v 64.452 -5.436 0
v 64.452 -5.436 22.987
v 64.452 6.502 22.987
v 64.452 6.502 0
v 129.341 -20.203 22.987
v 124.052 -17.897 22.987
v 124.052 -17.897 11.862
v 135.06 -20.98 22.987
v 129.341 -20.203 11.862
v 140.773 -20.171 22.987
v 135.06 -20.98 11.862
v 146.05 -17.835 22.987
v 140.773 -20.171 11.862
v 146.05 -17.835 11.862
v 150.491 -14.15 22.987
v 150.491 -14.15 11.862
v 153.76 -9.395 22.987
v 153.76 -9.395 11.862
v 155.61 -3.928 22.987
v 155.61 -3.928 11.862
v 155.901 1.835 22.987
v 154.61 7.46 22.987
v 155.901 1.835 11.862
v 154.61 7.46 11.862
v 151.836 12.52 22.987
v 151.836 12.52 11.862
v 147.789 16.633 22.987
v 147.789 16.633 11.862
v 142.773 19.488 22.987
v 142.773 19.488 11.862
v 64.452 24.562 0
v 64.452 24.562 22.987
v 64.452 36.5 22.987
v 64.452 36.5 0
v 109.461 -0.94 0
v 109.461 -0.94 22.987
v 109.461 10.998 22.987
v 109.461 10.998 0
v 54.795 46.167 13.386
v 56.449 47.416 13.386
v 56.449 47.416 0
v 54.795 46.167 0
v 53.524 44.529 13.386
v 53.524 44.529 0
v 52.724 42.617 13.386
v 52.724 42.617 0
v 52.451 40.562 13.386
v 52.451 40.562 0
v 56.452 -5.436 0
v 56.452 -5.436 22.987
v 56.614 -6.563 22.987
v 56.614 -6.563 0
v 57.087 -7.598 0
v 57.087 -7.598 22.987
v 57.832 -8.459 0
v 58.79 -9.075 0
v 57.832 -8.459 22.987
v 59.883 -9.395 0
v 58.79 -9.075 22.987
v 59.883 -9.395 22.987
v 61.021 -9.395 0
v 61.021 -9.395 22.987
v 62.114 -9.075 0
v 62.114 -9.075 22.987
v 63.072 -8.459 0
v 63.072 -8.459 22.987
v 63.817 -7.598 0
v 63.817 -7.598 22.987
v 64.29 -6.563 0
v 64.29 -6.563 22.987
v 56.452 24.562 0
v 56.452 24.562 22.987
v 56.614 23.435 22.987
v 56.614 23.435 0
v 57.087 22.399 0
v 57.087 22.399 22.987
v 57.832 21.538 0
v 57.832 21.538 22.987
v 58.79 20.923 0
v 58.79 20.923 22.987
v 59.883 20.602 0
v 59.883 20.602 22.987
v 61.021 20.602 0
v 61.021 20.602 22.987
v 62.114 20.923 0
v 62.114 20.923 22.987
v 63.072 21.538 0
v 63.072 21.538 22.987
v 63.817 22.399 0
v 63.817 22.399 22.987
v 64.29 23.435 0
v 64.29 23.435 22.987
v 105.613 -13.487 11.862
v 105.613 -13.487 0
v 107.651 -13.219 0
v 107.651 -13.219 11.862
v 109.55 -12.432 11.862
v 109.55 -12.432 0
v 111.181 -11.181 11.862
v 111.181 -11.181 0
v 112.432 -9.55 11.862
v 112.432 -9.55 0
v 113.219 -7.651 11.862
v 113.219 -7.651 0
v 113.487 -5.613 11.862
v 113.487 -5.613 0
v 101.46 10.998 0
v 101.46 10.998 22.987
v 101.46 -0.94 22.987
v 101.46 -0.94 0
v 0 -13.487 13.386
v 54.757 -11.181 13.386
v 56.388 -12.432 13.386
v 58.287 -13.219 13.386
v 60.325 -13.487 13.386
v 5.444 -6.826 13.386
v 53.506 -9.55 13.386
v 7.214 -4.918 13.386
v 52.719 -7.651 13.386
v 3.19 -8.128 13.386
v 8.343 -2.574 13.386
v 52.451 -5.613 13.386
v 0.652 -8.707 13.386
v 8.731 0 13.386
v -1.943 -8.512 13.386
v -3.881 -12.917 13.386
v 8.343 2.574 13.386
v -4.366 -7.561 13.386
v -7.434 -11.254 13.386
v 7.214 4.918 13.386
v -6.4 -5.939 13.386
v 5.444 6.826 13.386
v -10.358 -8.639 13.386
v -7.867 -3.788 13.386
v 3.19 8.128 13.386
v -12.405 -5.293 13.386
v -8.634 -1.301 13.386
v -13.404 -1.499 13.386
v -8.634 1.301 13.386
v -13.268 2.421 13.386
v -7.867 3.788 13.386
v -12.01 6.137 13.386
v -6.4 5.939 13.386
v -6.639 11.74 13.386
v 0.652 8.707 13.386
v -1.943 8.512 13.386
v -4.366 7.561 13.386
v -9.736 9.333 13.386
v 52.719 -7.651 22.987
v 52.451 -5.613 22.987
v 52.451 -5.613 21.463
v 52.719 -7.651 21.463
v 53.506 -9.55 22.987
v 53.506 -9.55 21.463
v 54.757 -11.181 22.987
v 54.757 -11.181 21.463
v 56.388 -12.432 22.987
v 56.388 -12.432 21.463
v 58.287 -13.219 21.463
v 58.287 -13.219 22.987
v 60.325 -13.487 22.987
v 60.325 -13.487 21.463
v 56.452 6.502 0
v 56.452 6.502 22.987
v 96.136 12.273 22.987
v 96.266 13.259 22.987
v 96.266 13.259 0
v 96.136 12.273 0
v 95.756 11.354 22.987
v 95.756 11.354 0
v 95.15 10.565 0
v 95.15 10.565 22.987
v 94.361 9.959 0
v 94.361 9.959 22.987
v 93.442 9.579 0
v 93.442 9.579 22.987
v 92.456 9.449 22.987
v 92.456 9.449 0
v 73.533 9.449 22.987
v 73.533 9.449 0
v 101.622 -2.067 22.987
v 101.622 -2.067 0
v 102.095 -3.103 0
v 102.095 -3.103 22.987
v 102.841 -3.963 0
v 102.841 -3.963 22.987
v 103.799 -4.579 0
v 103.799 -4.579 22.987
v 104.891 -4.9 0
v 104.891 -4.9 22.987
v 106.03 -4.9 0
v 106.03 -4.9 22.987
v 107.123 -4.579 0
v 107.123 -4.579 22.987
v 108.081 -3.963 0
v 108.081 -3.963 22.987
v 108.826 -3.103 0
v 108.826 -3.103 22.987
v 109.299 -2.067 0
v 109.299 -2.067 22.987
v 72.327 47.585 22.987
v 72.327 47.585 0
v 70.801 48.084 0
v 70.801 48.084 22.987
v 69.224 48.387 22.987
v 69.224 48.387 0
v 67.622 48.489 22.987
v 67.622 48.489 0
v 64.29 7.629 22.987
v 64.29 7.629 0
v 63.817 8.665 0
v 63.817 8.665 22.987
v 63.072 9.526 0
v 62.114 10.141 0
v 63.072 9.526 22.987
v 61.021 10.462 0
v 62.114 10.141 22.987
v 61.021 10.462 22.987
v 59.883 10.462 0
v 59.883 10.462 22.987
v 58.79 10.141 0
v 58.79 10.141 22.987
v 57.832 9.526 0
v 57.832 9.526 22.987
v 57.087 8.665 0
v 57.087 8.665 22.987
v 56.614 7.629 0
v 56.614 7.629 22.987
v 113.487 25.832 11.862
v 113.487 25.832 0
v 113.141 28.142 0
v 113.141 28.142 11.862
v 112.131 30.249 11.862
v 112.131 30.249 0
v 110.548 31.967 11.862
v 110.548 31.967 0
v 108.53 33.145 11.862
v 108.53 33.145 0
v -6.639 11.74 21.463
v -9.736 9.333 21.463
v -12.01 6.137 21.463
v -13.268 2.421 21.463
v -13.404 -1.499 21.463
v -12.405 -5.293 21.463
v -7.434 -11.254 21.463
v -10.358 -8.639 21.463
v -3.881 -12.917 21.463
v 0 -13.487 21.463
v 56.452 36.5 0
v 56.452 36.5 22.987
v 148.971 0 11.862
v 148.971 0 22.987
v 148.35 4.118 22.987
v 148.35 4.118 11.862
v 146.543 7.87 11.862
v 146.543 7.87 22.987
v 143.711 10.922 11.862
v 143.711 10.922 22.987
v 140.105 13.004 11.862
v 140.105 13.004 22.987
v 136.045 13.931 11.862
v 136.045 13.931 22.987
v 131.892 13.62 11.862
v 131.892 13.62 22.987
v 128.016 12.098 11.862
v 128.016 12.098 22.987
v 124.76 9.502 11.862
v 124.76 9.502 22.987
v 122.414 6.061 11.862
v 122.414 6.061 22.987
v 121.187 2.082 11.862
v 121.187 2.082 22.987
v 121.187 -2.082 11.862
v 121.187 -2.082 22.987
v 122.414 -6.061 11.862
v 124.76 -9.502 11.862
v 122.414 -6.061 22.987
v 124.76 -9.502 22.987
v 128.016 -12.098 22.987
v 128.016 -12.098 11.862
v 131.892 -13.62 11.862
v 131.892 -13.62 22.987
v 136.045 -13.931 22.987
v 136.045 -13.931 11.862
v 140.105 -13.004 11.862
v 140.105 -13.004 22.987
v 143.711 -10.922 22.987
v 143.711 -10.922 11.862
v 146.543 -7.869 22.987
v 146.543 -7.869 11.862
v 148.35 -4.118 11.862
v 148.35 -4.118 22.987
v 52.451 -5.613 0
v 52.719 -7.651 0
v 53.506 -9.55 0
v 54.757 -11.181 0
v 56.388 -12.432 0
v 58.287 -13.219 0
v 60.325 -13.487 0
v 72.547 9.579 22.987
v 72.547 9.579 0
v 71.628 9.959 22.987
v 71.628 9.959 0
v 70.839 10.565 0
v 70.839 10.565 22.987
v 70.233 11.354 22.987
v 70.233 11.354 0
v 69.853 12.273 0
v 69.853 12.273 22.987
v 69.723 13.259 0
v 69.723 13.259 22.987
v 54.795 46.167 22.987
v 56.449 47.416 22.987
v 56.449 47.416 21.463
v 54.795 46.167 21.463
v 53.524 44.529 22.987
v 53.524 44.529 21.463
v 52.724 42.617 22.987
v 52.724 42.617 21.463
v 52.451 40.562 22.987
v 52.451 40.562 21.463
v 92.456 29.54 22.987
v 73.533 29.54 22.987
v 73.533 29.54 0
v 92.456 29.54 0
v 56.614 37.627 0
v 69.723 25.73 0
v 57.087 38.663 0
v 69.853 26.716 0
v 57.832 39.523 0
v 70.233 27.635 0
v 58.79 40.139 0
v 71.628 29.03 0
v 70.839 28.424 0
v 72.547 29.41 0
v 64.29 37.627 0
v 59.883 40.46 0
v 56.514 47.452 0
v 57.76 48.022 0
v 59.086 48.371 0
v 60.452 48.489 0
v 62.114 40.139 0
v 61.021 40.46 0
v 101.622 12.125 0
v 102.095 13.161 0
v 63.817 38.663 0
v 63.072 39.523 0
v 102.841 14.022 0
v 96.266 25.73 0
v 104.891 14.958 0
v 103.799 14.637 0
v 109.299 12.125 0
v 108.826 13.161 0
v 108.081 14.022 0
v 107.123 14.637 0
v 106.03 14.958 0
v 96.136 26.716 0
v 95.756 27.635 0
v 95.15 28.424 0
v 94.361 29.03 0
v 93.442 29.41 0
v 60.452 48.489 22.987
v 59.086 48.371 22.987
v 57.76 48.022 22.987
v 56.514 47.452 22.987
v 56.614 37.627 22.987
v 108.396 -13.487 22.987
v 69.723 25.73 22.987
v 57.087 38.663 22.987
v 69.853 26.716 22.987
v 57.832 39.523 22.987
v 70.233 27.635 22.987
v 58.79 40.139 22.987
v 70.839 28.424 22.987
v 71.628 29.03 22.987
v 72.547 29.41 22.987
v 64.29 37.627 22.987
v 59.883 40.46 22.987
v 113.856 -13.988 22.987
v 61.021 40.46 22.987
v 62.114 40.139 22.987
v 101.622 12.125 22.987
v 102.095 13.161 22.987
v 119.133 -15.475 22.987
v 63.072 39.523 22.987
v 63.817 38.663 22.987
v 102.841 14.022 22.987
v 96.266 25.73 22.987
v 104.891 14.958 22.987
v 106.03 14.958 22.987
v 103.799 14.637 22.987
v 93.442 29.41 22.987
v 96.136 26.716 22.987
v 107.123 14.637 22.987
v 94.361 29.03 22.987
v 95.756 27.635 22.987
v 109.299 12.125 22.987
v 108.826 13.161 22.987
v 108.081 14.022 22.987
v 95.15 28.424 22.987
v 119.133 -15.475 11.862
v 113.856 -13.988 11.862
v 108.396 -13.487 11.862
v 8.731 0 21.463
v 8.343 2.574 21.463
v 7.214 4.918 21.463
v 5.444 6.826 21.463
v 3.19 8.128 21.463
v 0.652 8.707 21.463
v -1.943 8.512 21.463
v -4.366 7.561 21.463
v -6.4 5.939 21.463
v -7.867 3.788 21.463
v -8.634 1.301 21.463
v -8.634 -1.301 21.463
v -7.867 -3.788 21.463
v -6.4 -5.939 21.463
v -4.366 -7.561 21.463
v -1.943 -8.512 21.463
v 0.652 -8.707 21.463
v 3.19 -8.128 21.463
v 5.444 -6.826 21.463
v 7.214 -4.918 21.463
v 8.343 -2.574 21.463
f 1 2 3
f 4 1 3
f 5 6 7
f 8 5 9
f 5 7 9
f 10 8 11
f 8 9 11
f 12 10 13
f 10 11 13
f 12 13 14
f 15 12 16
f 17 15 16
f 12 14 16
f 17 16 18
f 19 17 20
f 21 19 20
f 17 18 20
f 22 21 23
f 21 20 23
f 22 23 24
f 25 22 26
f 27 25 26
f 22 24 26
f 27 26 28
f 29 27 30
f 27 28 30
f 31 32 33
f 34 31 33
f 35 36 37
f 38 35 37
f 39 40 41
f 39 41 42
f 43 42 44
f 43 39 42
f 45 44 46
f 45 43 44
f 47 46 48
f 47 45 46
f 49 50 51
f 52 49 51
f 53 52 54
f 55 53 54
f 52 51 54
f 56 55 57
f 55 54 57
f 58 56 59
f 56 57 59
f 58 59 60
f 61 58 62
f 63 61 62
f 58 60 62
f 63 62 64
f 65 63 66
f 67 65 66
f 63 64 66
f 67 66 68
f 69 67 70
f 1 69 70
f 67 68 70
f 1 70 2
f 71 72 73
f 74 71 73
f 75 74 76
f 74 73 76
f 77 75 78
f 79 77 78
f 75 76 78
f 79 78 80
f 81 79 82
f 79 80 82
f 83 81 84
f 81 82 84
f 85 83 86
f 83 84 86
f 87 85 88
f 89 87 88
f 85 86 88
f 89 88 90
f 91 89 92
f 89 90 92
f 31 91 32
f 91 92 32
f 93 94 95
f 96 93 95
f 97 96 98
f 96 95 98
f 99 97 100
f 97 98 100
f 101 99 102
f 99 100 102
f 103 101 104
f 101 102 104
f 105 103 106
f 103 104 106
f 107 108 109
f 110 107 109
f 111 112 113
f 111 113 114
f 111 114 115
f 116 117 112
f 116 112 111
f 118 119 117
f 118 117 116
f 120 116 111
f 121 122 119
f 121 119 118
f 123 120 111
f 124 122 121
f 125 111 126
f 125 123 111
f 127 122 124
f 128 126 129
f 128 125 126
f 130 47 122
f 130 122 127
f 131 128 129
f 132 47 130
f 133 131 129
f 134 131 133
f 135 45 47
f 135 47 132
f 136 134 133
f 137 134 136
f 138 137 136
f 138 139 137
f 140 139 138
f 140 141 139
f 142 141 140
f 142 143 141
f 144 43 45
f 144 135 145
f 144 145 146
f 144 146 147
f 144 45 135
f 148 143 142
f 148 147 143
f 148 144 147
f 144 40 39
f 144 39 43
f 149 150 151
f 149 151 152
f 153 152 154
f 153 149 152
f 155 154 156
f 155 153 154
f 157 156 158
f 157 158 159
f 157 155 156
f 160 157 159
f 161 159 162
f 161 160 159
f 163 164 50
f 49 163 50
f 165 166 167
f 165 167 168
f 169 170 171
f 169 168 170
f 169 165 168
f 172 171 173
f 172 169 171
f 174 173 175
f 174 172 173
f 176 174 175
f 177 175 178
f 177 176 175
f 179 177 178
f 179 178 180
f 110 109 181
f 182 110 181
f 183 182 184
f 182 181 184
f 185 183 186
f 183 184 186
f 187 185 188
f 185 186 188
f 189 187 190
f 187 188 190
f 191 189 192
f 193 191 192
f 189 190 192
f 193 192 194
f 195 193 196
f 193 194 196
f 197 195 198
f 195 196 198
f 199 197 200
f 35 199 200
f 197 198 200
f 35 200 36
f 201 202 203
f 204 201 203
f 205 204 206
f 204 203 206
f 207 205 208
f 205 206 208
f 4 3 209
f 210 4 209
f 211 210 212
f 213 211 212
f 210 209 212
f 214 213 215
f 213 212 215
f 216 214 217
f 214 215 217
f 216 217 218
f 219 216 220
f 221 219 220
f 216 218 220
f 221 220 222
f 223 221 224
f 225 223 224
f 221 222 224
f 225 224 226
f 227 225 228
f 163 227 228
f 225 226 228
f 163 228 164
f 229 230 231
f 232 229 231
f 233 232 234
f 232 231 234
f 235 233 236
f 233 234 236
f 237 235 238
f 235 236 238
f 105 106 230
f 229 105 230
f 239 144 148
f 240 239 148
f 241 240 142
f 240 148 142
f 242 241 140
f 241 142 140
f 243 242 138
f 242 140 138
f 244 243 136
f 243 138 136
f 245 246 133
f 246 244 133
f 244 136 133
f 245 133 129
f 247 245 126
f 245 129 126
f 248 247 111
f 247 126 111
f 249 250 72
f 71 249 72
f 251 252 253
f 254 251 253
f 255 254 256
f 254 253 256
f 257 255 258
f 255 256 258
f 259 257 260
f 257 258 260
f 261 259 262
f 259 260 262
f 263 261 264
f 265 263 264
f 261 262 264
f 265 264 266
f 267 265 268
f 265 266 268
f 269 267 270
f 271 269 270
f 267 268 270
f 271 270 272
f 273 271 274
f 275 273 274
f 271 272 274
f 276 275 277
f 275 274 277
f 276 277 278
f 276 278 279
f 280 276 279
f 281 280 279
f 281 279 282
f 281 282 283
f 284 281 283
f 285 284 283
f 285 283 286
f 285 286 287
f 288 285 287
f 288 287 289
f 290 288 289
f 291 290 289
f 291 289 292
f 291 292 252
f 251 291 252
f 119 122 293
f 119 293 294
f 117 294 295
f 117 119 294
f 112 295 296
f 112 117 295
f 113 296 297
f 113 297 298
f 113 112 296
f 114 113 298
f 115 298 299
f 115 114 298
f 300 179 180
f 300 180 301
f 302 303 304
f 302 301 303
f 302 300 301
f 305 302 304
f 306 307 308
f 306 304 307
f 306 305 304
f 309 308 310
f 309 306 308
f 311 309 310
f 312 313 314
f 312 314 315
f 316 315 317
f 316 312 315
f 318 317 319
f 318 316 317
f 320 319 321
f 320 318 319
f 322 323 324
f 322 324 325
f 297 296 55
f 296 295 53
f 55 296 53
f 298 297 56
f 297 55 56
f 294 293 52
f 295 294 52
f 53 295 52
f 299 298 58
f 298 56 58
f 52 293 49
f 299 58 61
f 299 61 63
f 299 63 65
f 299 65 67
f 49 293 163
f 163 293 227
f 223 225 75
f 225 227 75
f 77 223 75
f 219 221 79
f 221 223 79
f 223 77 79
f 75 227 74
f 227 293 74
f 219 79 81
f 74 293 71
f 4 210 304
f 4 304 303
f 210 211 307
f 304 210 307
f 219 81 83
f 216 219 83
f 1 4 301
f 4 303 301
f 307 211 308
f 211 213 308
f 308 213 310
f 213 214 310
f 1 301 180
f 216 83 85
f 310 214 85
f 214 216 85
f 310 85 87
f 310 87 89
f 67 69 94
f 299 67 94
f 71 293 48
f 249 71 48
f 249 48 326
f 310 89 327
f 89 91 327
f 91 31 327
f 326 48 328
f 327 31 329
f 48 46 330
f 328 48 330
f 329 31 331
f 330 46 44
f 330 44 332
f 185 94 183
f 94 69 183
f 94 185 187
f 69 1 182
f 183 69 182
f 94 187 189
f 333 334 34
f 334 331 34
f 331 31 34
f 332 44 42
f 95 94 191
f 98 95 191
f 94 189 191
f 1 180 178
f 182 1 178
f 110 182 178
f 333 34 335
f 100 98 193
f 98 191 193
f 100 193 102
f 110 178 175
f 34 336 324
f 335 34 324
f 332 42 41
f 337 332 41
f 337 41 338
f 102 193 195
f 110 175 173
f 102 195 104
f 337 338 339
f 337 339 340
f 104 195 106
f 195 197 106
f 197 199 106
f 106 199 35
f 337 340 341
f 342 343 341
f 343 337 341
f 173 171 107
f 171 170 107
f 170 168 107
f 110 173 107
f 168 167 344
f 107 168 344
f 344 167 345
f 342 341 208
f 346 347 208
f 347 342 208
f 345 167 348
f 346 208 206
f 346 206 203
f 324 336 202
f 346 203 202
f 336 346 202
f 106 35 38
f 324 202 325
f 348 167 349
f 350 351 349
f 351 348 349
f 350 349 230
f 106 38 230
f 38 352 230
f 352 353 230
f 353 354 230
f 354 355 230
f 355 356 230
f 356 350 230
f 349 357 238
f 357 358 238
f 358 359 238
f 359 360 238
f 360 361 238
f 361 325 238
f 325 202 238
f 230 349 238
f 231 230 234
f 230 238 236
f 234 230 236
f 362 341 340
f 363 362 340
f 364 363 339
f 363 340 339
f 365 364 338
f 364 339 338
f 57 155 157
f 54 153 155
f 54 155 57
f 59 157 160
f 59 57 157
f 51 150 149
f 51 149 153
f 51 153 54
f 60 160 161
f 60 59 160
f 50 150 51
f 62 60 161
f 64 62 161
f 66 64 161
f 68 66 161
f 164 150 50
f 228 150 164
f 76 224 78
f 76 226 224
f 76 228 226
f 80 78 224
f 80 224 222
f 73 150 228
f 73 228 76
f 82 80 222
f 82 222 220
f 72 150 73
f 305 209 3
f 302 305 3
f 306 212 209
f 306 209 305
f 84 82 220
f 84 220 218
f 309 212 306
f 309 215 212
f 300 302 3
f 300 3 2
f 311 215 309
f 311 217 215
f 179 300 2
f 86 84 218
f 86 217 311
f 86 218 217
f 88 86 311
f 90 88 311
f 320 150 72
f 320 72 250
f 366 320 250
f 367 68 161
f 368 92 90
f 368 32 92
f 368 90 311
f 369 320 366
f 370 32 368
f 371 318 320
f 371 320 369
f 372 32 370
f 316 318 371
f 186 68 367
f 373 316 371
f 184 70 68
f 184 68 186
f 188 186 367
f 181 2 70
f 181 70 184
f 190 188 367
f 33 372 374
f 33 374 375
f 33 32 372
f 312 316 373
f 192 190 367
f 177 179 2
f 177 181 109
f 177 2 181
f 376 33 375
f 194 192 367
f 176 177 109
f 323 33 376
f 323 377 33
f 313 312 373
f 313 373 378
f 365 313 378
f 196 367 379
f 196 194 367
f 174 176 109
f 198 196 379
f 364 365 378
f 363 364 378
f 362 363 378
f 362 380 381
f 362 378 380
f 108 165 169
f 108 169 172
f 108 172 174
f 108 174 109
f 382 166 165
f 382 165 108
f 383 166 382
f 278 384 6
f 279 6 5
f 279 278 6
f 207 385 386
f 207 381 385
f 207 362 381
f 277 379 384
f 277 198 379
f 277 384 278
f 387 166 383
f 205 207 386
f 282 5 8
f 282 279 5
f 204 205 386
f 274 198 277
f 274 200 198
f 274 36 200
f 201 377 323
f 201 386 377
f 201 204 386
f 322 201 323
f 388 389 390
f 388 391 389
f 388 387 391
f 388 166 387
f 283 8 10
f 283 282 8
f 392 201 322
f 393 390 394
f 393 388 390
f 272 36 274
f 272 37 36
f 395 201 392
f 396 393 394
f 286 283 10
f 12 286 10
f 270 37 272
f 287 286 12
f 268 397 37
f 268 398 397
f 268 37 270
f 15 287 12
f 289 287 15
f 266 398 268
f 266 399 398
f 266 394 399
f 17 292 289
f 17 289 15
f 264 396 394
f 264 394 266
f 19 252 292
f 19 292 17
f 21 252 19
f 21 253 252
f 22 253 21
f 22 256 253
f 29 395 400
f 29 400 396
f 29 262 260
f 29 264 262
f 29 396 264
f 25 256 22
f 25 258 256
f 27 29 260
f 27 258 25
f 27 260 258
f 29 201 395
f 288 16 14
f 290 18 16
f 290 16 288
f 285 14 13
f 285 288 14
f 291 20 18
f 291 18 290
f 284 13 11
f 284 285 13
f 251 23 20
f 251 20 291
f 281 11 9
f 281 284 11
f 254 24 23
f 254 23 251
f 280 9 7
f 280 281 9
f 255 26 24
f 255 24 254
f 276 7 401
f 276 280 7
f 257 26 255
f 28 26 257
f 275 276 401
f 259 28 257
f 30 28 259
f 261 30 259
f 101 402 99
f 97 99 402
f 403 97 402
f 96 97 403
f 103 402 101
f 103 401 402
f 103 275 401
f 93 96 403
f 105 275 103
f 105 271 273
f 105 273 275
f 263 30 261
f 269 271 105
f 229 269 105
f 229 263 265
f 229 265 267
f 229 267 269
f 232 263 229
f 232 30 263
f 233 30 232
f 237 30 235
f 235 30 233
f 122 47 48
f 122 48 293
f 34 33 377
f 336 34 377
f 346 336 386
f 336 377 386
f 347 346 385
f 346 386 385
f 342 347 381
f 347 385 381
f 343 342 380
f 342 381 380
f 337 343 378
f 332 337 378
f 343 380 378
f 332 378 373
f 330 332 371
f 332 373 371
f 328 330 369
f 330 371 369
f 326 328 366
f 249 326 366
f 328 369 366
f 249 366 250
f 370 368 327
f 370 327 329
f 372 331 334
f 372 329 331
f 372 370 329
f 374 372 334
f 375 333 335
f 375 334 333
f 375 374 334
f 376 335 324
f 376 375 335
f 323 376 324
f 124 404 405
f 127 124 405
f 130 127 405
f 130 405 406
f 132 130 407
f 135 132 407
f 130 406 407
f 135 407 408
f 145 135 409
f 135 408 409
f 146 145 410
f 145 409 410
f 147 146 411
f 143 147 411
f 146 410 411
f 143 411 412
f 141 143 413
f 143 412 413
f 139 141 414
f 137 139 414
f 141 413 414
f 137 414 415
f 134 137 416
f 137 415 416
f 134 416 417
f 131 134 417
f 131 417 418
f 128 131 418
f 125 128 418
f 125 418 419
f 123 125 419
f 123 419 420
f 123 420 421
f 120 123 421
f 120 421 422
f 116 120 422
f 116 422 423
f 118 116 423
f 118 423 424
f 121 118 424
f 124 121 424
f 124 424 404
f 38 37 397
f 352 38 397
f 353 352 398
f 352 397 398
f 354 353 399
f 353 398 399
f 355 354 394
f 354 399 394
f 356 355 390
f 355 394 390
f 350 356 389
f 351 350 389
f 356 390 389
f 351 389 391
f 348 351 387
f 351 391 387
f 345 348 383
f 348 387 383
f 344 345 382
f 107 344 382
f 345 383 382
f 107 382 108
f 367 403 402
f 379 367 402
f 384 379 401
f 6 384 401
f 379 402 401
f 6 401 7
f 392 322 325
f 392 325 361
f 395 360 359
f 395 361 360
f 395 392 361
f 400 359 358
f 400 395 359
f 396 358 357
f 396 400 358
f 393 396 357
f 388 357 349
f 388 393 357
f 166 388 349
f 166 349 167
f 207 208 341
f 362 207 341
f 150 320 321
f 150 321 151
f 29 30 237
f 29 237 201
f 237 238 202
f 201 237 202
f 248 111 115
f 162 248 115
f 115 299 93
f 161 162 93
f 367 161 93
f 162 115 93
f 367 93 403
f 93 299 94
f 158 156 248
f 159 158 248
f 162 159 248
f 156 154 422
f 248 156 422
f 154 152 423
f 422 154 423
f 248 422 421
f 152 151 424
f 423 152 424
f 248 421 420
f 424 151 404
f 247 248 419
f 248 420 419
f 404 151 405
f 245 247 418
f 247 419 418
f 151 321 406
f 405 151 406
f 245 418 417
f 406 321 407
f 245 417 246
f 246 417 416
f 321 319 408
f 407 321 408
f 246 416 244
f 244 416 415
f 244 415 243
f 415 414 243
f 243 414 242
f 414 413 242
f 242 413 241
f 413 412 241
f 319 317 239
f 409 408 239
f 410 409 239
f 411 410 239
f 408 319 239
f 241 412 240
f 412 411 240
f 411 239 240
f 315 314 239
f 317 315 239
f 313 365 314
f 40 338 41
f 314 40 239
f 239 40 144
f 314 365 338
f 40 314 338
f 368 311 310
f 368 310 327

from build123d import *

# Parameters (mm, degrees)
BASE_EXTRUDE_DEPTH = 22.987
CUT_EXTRUDE1_DEPTH = 1.524
CUT_EXTRUDE2_START = -13.3858
CUT_EXTRUDE2_DEPTH = 13.3858
CUT_EXTRUDE3_DEPTH = 11.8618
SKETCH5_R          = 8.73125
CUT_EXTRUDE4_DEPTH = 165.748162847
SKETCH6_R          = 13.97
CUT_EXTRUDE5_DEPTH = 165.9536267
CUT_EXTRUDE6_DEPTH = 165.9536267


with BuildPart() as part:
    # Sketch1 → Base-Extrude (new body)
    with BuildSketch(Plane.XY):
        with BuildLine():
            Line((67.622164121, 48.488607139), (60.451998121, 48.488607139))
            ThreePointArc((60.451998121, 48.488607139), (58.415767784, 48.225162891), (56.513628913, 47.45217869))
            Line((56.513628913, 47.45217869), (-6.63896207, 11.740278591))
            ThreePointArc((-6.63896207, 11.740278591), (-13.04330848, -3.432500932), (0, -13.4874))
            Line((0, -13.4874), (108.3963288, -13.4874))
            ThreePointArc((108.3963288, -13.4874), (116.52844195, -14.610715729), (124.051506942, -17.896533077))
            ThreePointArc((124.051506942, -17.896533077), (153.760306668, -9.394598854), (142.773406597, 19.487639521))
            Line((142.773406597, 19.487639521), (72.327100379, 47.584944713))
            ThreePointArc((72.327100379, 47.584944713), (70.017630202, 48.26064561), (67.622164121, 48.488607139))
        make_face()
    extrude(amount=BASE_EXTRUDE_DEPTH)

    # Sketch2 → Cut-Extrude1 (cut)
    with BuildSketch(Plane.XY.offset(22.987)):
        with BuildLine():
            Line((52.451, 40.561691476), (52.451, -5.6134))
            ThreePointArc((52.451, -5.6134), (54.757241386, -11.181158976), (60.325000513, -13.4874))
            Line((60.325000513, -13.4874), (60.325000513, -28.150605259))
            Line((60.325000513, -28.150605259), (-23.486257356, -28.150605259))
            Line((-23.486257356, -28.150605259), (-22.173444803, 52.159193632))
            Line((-22.173444803, 52.159193632), (56.513628913, 52.159193632))
            Line((56.513628913, 52.159193632), (56.513628913, 47.45217869))
            Line((56.513628913, 47.45217869), (56.449146437, 47.415714759))
            ThreePointArc((56.449146437, 47.415714759), (53.523590332, 44.529146898), (52.451, 40.561691476))
        make_face()
    extrude(amount=-CUT_EXTRUDE1_DEPTH, mode=Mode.SUBTRACT)

    # Sketch3 → Cut-Extrude2 (cut)
    with BuildSketch(Plane(origin=(0, 0, 0), x_dir=(-1, 0, 0), z_dir=(0, 0, -1)).offset(CUT_EXTRUDE2_START)):
        with BuildLine():
            Line((-52.451, 40.561691476), (-52.451, -5.6134))
            ThreePointArc((-52.451, -5.6134), (-54.757241386, -11.181158976), (-60.325000513, -13.4874))
            Line((-60.325000513, -13.4874), (-60.325000513, -35.585726692))
            Line((-60.325000513, -35.585726692), (18.461929403, -35.585726692))
            Line((18.461929403, -35.585726692), (18.461929403, 62.437610527))
            Line((18.461929403, 62.437610527), (-56.449146437, 62.437610527))
            Line((-56.449146437, 62.437610527), (-56.449146437, 47.415714759))
            ThreePointArc((-56.449146437, 47.415714759), (-53.523590332, 44.529146898), (-52.451, 40.561691476))
        make_face()
    extrude(amount=CUT_EXTRUDE2_DEPTH, mode=Mode.SUBTRACT)

    # Sketch4 → Cut-Extrude3 (cut)
    with BuildSketch(Plane(origin=(0, 0, 0), x_dir=(-1, 0, 0), z_dir=(0, 0, -1))):
        with BuildLine():
            Line((-113.4872, -5.6134), (-113.4872, 25.831689784))
            ThreePointArc((-113.4872, 25.831689784), (-112.131206016, 30.249321907), (-108.530259798, 33.145419212))
            Line((-108.530259798, 33.145419212), (-119.346107198, 60.263197686))
            Line((-119.346107198, 60.263197686), (-162.925004358, 60.263197686))
            Line((-162.925004358, 60.263197686), (-162.925004358, -25.739632552))
            Line((-162.925004358, -25.739632552), (-105.6132, -25.739632552))
            Line((-105.6132, -25.739632552), (-105.6132, -13.4874))
            ThreePointArc((-105.6132, -13.4874), (-111.180958795, -11.181158795), (-113.4872, -5.6134))
        make_face()
    extrude(amount=-CUT_EXTRUDE3_DEPTH, mode=Mode.SUBTRACT)

    # Sketch5 → Cut-Extrude4 (cut, through all)
    with BuildSketch(Plane.XY.offset(21.463)):
        Circle(SKETCH5_R)
    extrude(amount=-CUT_EXTRUDE4_DEPTH, mode=Mode.SUBTRACT)

    # Sketch6 → Cut-Extrude5 (cut, through all)
    with BuildSketch(Plane.XY.offset(22.987)):
        with Locations((135.000853225, 8.827e-05)):
            Circle(SKETCH6_R)
    extrude(amount=-CUT_EXTRUDE5_DEPTH, mode=Mode.SUBTRACT)

    # Sketch7 → Cut-Extrude6 (cut, through all)
    with BuildSketch(Plane.XY.offset(22.987)):
        with BuildLine():
            Line((64.4525, -5.4356), (64.4525, 6.5024))
            ThreePointArc((64.4525, 6.5024), (60.452, 10.5029), (56.4515, 6.5024))
            Line((56.4515, 6.5024), (56.4515, -5.4356))
            ThreePointArc((56.4515, -5.4356), (60.452, -9.4361), (64.4525, -5.4356))
        make_face()
        with BuildLine():
            Line((64.4525, 24.5618), (64.4525, 36.4998))
            ThreePointArc((64.4525, 36.4998), (60.452, 40.5003), (56.4515, 36.4998))
            Line((56.4515, 36.4998), (56.4515, 24.5618))
            ThreePointArc((56.4515, 24.5618), (60.452, 20.5613), (64.4525, 24.5618))
        make_face()
        with BuildLine():
            Line((101.4603, 10.9982), (101.4603, -0.9398))
            ThreePointArc((101.4603, -0.9398), (105.4608, -4.9403), (109.4613, -0.9398))
            Line((109.4613, -0.9398), (109.4613, 10.9982))
            ThreePointArc((109.4613, 10.9982), (105.4608, 14.9987), (101.4603, 10.9982))
        make_face()
        with BuildLine():
            Line((73.533, 29.5402), (92.456, 29.5402))
            ThreePointArc((92.456, 29.5402), (95.150076836, 28.424276836), (96.266, 25.7302))
            Line((96.266, 25.7302), (96.266, 13.2588))
            ThreePointArc((96.266, 13.2588), (95.150076836, 10.564723164), (92.456, 9.4488))
            Line((92.456, 9.4488), (73.533, 9.4488))
            ThreePointArc((73.533, 9.4488), (70.838923164, 10.564723164), (69.723, 13.2588))
            Line((69.723, 13.2588), (69.723, 25.7302))
            ThreePointArc((69.723, 25.7302), (70.838923164, 28.424276836), (73.533, 29.5402))
        make_face()
    extrude(amount=-CUT_EXTRUDE6_DEPTH, mode=Mode.SUBTRACT)


solid = part.part
